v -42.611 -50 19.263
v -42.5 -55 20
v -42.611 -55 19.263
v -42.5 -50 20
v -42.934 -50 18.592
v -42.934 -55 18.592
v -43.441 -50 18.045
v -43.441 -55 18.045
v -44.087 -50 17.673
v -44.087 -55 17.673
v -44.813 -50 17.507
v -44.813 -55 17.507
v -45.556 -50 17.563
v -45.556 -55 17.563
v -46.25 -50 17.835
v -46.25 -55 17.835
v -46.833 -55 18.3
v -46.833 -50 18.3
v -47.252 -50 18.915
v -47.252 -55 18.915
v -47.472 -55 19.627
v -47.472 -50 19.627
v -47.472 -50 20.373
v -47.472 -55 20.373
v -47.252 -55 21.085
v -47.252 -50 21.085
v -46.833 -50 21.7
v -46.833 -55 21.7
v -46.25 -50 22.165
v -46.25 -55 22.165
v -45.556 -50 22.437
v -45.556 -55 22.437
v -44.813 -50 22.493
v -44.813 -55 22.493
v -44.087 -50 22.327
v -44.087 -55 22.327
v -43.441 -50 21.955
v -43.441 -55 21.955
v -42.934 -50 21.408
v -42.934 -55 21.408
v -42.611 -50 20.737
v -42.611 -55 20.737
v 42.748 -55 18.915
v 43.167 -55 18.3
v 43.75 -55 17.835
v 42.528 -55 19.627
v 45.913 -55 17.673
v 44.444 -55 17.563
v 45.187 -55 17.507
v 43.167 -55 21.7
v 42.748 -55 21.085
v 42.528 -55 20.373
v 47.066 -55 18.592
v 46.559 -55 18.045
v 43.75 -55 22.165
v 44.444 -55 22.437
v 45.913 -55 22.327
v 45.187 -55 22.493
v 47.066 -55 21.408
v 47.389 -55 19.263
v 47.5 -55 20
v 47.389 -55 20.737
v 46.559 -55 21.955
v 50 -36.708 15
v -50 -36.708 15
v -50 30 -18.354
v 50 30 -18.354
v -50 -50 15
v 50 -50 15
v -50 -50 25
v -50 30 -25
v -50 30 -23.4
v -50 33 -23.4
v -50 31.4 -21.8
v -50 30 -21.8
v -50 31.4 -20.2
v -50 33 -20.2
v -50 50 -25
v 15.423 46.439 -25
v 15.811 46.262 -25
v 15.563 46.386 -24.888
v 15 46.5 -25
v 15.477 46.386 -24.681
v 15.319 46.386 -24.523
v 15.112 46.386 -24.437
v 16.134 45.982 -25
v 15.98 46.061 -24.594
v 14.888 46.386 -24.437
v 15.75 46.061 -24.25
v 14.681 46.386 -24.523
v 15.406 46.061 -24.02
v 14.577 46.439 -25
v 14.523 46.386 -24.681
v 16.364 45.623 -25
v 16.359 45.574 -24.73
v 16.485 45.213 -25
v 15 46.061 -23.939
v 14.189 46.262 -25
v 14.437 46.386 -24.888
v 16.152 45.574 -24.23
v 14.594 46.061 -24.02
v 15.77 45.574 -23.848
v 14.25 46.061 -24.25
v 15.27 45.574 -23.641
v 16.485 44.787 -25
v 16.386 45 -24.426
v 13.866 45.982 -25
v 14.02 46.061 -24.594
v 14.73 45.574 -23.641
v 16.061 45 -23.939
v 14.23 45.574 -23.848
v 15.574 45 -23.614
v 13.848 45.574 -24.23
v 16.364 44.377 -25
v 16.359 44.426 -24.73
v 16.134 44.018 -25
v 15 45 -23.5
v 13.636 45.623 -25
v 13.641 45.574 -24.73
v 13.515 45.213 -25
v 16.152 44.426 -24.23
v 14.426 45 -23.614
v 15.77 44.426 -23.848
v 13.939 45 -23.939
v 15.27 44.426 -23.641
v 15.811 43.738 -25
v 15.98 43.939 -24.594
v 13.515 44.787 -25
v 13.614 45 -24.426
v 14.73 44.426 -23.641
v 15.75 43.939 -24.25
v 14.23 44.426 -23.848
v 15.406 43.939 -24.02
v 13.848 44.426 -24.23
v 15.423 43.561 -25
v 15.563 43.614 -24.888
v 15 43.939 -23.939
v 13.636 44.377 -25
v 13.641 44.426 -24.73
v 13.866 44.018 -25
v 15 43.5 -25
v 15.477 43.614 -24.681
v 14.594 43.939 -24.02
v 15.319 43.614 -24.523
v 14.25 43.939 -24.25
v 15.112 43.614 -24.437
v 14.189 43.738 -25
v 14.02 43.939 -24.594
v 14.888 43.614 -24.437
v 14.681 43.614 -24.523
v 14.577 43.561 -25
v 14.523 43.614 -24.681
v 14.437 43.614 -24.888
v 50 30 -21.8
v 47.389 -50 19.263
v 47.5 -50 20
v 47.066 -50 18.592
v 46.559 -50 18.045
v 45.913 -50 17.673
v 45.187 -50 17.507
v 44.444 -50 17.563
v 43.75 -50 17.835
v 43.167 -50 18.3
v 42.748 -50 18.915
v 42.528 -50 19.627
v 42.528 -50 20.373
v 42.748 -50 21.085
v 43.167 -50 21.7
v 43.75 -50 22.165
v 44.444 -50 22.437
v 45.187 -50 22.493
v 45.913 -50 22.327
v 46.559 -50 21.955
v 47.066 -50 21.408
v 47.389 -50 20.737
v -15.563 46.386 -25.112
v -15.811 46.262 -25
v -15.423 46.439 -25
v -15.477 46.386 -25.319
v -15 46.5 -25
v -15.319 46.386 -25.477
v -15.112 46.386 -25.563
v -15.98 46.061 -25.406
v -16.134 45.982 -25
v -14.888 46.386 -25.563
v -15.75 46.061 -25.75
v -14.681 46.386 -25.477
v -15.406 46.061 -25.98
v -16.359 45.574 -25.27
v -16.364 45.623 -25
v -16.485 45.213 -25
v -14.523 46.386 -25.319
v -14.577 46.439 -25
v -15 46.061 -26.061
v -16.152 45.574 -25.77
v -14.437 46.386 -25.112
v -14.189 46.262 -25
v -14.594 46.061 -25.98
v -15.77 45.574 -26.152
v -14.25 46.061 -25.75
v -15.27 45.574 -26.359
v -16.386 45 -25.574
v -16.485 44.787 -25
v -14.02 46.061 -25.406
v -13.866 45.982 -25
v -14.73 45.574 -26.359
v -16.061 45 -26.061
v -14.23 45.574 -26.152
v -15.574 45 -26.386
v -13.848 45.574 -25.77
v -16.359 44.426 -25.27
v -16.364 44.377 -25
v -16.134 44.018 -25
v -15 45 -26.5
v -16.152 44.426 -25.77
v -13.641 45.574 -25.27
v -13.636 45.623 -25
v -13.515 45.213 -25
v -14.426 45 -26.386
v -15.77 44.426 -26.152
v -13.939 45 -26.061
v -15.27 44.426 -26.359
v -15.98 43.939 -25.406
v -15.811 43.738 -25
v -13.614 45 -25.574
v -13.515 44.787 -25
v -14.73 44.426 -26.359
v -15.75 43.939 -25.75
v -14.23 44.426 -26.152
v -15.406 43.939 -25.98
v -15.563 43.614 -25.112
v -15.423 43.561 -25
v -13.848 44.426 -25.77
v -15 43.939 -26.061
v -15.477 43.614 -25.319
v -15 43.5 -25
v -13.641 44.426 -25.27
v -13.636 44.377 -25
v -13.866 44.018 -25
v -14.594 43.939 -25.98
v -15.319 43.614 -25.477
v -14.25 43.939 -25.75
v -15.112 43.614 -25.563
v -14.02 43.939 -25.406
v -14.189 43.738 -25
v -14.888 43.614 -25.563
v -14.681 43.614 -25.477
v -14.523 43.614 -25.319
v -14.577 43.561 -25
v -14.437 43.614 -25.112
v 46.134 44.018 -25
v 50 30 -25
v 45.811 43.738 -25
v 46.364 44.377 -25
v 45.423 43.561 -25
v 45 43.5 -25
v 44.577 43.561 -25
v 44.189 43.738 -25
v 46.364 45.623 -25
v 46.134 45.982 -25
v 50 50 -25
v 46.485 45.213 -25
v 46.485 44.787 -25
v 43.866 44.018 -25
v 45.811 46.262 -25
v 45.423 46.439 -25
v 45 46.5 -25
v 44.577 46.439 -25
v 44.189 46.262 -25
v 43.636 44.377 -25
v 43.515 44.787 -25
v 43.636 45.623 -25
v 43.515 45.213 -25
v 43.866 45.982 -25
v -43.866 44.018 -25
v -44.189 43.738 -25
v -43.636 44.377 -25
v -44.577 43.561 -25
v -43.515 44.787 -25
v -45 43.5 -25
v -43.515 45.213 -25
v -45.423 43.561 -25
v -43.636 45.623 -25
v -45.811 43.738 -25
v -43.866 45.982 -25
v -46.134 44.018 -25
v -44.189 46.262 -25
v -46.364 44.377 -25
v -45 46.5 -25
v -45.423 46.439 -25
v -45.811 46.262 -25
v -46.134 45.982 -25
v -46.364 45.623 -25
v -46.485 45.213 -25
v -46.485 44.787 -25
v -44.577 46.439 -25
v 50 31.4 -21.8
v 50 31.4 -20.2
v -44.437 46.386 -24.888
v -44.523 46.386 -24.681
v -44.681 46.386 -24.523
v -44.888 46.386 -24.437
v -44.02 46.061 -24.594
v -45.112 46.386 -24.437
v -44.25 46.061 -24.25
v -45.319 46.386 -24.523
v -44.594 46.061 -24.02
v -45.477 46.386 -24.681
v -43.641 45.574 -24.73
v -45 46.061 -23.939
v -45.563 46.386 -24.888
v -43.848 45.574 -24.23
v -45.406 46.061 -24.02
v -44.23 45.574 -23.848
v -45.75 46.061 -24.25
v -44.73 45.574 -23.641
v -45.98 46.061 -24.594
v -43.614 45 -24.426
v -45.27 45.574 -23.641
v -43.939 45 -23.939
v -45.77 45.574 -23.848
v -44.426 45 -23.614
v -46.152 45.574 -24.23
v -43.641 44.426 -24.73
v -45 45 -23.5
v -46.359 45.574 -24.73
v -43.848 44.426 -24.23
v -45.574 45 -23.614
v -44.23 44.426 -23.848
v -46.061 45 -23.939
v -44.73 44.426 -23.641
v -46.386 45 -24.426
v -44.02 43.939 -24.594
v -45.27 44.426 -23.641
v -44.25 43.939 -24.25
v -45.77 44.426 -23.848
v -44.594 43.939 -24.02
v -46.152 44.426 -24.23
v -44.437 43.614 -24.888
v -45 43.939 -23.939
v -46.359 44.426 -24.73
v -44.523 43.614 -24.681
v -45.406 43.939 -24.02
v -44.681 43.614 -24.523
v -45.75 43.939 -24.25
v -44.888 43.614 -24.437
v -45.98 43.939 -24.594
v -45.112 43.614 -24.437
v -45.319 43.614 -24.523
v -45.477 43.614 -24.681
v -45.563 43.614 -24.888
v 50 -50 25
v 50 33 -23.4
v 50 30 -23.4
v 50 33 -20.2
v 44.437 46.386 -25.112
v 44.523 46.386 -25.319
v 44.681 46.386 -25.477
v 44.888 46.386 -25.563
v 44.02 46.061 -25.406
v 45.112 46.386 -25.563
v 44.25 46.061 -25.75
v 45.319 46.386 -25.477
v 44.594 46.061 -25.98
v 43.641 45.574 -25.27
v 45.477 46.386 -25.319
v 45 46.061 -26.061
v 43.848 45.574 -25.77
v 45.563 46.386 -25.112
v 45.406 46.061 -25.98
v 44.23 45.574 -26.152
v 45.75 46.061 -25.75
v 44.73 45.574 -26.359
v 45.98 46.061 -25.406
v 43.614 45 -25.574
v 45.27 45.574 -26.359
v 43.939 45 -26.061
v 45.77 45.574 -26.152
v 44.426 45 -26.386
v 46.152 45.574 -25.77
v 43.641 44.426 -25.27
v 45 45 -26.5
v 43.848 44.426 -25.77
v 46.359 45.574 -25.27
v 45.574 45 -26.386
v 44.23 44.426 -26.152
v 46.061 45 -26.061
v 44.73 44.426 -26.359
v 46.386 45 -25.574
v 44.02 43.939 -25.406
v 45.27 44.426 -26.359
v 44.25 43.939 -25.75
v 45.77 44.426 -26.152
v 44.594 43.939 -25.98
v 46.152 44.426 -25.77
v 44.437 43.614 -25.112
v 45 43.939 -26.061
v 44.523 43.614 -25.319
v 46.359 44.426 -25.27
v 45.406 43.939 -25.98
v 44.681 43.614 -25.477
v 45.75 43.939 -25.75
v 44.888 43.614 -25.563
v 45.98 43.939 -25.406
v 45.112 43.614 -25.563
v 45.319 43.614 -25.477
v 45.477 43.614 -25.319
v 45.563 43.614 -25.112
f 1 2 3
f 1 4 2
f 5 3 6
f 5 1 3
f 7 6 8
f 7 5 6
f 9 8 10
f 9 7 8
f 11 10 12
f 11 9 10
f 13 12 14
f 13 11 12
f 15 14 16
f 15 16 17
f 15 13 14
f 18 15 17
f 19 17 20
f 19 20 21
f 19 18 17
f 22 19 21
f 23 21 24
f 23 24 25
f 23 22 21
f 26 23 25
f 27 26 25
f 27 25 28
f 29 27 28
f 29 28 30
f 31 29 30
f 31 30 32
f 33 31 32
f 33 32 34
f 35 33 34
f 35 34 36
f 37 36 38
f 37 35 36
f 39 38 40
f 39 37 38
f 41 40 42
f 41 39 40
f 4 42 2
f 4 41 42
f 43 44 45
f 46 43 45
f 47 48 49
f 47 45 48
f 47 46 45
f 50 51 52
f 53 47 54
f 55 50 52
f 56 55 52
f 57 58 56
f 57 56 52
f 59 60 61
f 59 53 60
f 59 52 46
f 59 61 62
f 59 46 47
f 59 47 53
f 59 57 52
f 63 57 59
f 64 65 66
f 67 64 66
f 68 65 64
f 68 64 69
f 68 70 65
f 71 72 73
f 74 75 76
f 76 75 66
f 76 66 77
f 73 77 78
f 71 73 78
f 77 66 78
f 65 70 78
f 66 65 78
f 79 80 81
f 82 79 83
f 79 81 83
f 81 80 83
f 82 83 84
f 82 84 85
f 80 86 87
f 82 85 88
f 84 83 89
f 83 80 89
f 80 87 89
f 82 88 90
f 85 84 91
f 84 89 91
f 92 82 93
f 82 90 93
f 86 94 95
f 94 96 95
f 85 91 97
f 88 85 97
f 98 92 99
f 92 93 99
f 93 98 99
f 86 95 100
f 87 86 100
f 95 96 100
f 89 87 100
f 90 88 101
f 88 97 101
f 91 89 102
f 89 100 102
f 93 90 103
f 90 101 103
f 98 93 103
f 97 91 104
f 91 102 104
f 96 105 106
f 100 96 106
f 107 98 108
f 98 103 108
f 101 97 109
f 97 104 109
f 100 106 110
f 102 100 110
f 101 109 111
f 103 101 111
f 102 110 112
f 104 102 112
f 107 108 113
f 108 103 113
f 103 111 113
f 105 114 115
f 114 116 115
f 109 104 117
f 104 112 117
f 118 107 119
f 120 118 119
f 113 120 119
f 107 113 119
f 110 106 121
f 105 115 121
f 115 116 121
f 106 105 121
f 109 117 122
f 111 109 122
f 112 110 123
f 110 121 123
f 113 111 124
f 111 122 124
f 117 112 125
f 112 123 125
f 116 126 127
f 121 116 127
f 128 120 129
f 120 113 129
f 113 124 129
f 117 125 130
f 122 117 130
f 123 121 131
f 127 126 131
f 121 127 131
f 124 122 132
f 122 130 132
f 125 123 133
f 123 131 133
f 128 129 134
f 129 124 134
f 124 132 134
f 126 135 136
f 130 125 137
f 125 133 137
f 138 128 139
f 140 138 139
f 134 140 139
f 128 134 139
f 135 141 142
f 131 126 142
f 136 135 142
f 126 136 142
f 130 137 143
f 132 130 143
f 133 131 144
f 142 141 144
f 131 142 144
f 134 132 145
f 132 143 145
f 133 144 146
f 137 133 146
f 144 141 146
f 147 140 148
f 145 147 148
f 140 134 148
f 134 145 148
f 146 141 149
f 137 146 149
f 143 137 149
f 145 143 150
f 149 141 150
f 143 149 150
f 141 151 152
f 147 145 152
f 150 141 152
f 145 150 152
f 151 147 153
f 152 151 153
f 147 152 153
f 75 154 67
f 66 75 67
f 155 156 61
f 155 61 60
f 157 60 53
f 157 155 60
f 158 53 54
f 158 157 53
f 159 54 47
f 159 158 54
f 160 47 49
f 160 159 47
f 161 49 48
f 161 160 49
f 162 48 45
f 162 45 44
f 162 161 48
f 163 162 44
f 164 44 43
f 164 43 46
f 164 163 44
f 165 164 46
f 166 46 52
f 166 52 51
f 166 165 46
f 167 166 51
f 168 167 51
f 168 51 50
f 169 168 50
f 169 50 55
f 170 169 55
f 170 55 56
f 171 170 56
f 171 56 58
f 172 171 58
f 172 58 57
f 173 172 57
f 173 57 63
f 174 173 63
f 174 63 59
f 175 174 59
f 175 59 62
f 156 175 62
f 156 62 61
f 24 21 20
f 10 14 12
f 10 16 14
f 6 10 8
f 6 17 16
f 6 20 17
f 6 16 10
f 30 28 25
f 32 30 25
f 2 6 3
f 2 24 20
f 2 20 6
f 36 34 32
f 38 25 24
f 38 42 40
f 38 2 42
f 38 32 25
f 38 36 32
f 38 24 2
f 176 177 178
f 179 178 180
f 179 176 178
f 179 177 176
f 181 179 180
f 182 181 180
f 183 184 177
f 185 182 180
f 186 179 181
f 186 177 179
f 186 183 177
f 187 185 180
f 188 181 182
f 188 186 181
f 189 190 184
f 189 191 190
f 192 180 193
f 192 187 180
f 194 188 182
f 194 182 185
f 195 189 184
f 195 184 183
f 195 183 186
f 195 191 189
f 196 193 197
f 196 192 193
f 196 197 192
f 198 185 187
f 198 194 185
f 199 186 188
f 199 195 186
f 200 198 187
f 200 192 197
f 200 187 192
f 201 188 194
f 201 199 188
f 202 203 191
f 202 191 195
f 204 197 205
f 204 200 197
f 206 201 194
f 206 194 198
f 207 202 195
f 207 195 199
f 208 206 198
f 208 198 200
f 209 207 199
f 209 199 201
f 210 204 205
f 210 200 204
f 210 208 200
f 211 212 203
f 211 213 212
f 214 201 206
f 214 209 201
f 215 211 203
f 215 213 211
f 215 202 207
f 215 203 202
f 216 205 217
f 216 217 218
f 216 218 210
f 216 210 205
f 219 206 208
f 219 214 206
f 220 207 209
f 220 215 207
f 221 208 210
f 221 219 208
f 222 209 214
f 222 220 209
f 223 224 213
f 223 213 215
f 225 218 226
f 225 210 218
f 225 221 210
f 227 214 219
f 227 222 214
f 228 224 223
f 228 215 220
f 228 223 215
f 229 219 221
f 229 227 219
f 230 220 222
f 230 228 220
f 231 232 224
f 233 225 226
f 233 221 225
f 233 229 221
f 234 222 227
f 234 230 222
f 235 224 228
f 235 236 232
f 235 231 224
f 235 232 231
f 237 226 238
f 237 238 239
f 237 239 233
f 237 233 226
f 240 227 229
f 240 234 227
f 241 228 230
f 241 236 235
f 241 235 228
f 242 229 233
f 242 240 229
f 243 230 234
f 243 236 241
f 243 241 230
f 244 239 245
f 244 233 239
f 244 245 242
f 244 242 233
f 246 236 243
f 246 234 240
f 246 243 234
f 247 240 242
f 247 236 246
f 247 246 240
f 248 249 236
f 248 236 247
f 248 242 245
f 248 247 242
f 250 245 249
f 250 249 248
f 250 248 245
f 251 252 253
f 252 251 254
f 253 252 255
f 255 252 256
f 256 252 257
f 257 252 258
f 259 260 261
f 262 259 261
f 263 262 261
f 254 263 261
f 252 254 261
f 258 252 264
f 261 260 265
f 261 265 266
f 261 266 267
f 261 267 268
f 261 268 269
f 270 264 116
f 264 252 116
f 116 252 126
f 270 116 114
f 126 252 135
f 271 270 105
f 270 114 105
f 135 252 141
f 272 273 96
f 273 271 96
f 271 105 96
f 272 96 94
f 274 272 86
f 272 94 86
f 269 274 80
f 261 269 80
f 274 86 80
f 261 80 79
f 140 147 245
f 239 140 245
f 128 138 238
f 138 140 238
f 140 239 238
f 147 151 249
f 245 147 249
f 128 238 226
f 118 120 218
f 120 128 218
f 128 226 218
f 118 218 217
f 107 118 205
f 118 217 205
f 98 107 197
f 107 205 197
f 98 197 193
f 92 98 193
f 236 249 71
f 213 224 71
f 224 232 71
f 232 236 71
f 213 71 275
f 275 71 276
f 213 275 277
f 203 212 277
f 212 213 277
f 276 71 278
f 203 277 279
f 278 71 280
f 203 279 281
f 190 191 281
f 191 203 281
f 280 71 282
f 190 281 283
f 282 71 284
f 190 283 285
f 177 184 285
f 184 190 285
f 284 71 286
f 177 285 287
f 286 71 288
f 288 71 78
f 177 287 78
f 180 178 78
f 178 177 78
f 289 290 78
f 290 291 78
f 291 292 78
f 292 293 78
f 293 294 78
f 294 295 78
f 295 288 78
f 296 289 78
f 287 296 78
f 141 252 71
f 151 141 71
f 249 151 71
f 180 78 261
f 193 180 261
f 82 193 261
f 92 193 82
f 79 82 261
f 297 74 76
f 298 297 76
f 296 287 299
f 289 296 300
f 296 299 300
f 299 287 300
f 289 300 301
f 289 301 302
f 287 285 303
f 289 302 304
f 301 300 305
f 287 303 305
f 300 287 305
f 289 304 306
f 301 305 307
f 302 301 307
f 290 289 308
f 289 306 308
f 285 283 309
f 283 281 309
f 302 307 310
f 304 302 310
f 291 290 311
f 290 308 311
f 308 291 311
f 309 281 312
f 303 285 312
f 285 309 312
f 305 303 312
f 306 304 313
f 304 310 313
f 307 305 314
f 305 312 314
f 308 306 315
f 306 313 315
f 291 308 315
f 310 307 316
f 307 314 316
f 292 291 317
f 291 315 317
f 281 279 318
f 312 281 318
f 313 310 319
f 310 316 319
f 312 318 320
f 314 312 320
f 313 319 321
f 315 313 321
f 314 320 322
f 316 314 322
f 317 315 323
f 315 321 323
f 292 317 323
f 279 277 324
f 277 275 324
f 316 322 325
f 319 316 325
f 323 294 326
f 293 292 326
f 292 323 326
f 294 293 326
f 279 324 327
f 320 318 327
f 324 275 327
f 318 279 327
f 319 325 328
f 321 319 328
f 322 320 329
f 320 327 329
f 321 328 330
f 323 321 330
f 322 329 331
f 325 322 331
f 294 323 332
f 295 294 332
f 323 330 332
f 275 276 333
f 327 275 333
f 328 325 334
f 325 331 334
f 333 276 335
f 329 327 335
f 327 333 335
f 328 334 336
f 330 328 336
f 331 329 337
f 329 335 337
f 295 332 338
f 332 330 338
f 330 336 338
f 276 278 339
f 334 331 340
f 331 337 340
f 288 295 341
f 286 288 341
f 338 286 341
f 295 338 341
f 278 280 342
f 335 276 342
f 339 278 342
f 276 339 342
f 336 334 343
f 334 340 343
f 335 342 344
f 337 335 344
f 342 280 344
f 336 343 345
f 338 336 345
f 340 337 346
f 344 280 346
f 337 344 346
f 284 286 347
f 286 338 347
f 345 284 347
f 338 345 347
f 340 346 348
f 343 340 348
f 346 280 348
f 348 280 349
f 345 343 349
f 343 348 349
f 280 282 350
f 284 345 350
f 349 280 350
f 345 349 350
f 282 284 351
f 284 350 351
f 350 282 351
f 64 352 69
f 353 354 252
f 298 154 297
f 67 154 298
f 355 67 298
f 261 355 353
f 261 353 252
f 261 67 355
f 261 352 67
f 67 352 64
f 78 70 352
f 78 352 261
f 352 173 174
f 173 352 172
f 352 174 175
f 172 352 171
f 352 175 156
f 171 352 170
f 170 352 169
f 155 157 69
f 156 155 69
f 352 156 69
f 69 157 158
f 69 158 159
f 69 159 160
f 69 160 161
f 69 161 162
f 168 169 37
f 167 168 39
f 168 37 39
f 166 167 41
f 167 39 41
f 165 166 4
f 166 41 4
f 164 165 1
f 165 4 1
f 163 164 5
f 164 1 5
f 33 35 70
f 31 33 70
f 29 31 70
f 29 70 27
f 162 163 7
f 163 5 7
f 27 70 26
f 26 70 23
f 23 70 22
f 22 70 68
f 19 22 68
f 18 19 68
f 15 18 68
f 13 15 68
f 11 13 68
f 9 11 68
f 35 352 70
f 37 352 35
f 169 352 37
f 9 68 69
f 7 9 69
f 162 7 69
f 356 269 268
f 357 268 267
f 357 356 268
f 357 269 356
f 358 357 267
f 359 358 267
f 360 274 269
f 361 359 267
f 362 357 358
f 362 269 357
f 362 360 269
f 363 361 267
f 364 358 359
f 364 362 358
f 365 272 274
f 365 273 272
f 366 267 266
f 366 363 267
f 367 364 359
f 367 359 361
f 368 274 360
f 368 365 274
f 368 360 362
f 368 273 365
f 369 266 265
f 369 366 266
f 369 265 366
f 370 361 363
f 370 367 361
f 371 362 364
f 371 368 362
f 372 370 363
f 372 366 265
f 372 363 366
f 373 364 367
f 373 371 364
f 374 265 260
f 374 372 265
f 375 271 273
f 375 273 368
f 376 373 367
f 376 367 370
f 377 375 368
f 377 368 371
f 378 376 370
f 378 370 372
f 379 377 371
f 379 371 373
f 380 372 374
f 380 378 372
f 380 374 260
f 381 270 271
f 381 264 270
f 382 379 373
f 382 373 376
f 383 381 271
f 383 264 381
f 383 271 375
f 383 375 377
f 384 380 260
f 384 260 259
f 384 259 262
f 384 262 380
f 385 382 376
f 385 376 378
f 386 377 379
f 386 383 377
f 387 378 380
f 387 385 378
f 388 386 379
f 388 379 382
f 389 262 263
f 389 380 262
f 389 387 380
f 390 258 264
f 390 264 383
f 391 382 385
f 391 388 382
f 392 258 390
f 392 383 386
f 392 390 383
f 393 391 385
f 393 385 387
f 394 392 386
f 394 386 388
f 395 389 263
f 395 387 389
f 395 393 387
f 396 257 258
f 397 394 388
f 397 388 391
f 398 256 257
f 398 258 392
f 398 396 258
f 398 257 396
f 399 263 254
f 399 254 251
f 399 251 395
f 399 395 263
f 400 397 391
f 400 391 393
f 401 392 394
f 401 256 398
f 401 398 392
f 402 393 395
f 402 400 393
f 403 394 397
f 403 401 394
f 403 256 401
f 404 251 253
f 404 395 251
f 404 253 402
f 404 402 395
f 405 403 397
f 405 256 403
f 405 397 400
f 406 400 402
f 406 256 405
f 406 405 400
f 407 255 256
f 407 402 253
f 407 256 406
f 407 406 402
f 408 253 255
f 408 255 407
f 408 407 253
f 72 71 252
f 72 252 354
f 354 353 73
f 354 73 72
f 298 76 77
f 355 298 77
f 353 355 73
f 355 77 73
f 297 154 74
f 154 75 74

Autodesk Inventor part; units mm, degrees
sketch "Sketch1" plane through (0, 0, 0) normal (1, 0, 0) x (0, 1, 0)
  line L0 (50, 25) -> (-50, 25)
  line L1 (-50, 25) -> (-50, -25)
  line L2 (-50, -25) -> (50, -25)
  line L3 (50, -25) -> (50, 25)
  line L4 (-70, 0) -> (70, 0) projected
  line L5 (0, 35) -> (0, -35) projected
  line L6 (-50, 25) -> (50, -25)
  line L7 (-36.7082, 15) -> (30, -18.3541)
  line L8 (-36.7082, 15) -> (-50, 15)
  line L9 (30, -25) -> (30, -18.3541)
  line L10 (30, -21.8) -> (33, -21.8)
  line L11 (33, -21.8) -> (33, -23.4)
  line L12 (33, -23.4) -> (30, -23.4)
  line L13 (30, -23.4) -> (30, -21.8)
  line L14 (33, -21.8) -> (31.4, -21.8)
  line L15 (31.4, -21.8) -> (31.4, -20.2)
  line L16 (31.4, -20.2) -> (33, -20.2)
  line L17 (33, -20.2) -> (33, -21.8)
  point P0 (0, 0)
  point P1 (50, 0)
  point P2 (0, 25)
  point P3 (43.2918, -25)
  point P4 (-50, 21.6459)
  dimension "d0" = 50
  dimension "d1" = 100
  dimension "d2" = 3
  dimension "d5" = 10
  dimension "d6" = 20
  dimension "d95" = 3
  dimension "d96" = 1.6
  dimension "d97" = 1.6
  dimension "d98" = 1.6
  dimension "d99" = 1.6
extrude "Extrusion1" add sketch "Sketch1" along normal mid plane 100 contours L6 L4 L7 L8 L1 | L5 L7 L4 | L6 L2 L9 L12 L11 L17 L16 L15 L10 L7 L5
sketch "Sketch4" plane through (50, 50, -25) normal (0, 0, -1) x (-1, 0, 0)
  circle A0 centre (5, -5) radius 1.5
  line L0 (0, -20) -> (0, 0) projected
  line L1 (100, 0) -> (0, 0) projected
  line L2 (5, -3.5) -> (5, -6.5)
  circle A1 centre (35, -5) radius 1.5
  line L3 (35, -3.5) -> (35, -6.5)
  circle A2 centre (65, -5) radius 1.5
  line L4 (65, -3.5) -> (65, -6.5)
  circle A3 centre (95, -5) radius 1.5
  line L5 (95, -3.5) -> (95, -6.5)
  point P0 (50, -50)
  point P1 (0, -100)
  dimension "d45" = 3
  dimension "d46" = 5
  dimension "d47" = 5
  dimension "d48" = 3
  dimension "d107" = 3
  dimension "d108" = 5
  dimension "d109" = 30
  dimension "d110" = 3
  dimension "d120" = 60
  dimension "d127" = 60
revolve "Revolution2" add sketch "Sketch4" angle 360 about axis through (45, 46.5, -25) along (0, -1, 0) picked at (4.5036, -4.9397) contours L2 A0
revolve "Revolution3" cut sketch "Sketch4" angle 360 about axis through (15, 46.5, -25) along (0, -1, 0) picked at (34.5036, -5.0603) contours L3 A1
revolve "Revolution4" add sketch "Sketch4" angle 360 about axis through (-15, 46.5, -25) along (0, -1, 0) picked at (64.2365, -5.2413) contours L4 A2
revolve "Revolution5" cut sketch "Sketch4" angle 360 about axis through (-45, 46.5, -25) along (0, -1, 0) picked at (94.1238, -4.716) contours L5 A3
sketch "Sketch5" plane through (-50, -50, 15) normal (0, -1, 0) x (1, 0, 0)
  circle A0 centre (5, 5) radius 2.5
  line L0 (0, 0) -> (0, 10) projected
  line L1 (0, 10) -> (100, 10) projected
  line L2 (50, 20) -> (50, -50) projected
  circle A1 centre (95, 5) radius 2.5
  line L3 (0, 5) -> (100, 5)
  line L4 (100, -40) -> (100, 10) projected
  point P0 (50, -15)
  dimension "d76" = 5
  dimension "d77" = 5
extrude "Extrusion3" add sketch "Sketch5" along normal blind 5 contours L3 A0 | A0 L3 | L3 A1 | A1 L3
properties part number "Roof_Large"
